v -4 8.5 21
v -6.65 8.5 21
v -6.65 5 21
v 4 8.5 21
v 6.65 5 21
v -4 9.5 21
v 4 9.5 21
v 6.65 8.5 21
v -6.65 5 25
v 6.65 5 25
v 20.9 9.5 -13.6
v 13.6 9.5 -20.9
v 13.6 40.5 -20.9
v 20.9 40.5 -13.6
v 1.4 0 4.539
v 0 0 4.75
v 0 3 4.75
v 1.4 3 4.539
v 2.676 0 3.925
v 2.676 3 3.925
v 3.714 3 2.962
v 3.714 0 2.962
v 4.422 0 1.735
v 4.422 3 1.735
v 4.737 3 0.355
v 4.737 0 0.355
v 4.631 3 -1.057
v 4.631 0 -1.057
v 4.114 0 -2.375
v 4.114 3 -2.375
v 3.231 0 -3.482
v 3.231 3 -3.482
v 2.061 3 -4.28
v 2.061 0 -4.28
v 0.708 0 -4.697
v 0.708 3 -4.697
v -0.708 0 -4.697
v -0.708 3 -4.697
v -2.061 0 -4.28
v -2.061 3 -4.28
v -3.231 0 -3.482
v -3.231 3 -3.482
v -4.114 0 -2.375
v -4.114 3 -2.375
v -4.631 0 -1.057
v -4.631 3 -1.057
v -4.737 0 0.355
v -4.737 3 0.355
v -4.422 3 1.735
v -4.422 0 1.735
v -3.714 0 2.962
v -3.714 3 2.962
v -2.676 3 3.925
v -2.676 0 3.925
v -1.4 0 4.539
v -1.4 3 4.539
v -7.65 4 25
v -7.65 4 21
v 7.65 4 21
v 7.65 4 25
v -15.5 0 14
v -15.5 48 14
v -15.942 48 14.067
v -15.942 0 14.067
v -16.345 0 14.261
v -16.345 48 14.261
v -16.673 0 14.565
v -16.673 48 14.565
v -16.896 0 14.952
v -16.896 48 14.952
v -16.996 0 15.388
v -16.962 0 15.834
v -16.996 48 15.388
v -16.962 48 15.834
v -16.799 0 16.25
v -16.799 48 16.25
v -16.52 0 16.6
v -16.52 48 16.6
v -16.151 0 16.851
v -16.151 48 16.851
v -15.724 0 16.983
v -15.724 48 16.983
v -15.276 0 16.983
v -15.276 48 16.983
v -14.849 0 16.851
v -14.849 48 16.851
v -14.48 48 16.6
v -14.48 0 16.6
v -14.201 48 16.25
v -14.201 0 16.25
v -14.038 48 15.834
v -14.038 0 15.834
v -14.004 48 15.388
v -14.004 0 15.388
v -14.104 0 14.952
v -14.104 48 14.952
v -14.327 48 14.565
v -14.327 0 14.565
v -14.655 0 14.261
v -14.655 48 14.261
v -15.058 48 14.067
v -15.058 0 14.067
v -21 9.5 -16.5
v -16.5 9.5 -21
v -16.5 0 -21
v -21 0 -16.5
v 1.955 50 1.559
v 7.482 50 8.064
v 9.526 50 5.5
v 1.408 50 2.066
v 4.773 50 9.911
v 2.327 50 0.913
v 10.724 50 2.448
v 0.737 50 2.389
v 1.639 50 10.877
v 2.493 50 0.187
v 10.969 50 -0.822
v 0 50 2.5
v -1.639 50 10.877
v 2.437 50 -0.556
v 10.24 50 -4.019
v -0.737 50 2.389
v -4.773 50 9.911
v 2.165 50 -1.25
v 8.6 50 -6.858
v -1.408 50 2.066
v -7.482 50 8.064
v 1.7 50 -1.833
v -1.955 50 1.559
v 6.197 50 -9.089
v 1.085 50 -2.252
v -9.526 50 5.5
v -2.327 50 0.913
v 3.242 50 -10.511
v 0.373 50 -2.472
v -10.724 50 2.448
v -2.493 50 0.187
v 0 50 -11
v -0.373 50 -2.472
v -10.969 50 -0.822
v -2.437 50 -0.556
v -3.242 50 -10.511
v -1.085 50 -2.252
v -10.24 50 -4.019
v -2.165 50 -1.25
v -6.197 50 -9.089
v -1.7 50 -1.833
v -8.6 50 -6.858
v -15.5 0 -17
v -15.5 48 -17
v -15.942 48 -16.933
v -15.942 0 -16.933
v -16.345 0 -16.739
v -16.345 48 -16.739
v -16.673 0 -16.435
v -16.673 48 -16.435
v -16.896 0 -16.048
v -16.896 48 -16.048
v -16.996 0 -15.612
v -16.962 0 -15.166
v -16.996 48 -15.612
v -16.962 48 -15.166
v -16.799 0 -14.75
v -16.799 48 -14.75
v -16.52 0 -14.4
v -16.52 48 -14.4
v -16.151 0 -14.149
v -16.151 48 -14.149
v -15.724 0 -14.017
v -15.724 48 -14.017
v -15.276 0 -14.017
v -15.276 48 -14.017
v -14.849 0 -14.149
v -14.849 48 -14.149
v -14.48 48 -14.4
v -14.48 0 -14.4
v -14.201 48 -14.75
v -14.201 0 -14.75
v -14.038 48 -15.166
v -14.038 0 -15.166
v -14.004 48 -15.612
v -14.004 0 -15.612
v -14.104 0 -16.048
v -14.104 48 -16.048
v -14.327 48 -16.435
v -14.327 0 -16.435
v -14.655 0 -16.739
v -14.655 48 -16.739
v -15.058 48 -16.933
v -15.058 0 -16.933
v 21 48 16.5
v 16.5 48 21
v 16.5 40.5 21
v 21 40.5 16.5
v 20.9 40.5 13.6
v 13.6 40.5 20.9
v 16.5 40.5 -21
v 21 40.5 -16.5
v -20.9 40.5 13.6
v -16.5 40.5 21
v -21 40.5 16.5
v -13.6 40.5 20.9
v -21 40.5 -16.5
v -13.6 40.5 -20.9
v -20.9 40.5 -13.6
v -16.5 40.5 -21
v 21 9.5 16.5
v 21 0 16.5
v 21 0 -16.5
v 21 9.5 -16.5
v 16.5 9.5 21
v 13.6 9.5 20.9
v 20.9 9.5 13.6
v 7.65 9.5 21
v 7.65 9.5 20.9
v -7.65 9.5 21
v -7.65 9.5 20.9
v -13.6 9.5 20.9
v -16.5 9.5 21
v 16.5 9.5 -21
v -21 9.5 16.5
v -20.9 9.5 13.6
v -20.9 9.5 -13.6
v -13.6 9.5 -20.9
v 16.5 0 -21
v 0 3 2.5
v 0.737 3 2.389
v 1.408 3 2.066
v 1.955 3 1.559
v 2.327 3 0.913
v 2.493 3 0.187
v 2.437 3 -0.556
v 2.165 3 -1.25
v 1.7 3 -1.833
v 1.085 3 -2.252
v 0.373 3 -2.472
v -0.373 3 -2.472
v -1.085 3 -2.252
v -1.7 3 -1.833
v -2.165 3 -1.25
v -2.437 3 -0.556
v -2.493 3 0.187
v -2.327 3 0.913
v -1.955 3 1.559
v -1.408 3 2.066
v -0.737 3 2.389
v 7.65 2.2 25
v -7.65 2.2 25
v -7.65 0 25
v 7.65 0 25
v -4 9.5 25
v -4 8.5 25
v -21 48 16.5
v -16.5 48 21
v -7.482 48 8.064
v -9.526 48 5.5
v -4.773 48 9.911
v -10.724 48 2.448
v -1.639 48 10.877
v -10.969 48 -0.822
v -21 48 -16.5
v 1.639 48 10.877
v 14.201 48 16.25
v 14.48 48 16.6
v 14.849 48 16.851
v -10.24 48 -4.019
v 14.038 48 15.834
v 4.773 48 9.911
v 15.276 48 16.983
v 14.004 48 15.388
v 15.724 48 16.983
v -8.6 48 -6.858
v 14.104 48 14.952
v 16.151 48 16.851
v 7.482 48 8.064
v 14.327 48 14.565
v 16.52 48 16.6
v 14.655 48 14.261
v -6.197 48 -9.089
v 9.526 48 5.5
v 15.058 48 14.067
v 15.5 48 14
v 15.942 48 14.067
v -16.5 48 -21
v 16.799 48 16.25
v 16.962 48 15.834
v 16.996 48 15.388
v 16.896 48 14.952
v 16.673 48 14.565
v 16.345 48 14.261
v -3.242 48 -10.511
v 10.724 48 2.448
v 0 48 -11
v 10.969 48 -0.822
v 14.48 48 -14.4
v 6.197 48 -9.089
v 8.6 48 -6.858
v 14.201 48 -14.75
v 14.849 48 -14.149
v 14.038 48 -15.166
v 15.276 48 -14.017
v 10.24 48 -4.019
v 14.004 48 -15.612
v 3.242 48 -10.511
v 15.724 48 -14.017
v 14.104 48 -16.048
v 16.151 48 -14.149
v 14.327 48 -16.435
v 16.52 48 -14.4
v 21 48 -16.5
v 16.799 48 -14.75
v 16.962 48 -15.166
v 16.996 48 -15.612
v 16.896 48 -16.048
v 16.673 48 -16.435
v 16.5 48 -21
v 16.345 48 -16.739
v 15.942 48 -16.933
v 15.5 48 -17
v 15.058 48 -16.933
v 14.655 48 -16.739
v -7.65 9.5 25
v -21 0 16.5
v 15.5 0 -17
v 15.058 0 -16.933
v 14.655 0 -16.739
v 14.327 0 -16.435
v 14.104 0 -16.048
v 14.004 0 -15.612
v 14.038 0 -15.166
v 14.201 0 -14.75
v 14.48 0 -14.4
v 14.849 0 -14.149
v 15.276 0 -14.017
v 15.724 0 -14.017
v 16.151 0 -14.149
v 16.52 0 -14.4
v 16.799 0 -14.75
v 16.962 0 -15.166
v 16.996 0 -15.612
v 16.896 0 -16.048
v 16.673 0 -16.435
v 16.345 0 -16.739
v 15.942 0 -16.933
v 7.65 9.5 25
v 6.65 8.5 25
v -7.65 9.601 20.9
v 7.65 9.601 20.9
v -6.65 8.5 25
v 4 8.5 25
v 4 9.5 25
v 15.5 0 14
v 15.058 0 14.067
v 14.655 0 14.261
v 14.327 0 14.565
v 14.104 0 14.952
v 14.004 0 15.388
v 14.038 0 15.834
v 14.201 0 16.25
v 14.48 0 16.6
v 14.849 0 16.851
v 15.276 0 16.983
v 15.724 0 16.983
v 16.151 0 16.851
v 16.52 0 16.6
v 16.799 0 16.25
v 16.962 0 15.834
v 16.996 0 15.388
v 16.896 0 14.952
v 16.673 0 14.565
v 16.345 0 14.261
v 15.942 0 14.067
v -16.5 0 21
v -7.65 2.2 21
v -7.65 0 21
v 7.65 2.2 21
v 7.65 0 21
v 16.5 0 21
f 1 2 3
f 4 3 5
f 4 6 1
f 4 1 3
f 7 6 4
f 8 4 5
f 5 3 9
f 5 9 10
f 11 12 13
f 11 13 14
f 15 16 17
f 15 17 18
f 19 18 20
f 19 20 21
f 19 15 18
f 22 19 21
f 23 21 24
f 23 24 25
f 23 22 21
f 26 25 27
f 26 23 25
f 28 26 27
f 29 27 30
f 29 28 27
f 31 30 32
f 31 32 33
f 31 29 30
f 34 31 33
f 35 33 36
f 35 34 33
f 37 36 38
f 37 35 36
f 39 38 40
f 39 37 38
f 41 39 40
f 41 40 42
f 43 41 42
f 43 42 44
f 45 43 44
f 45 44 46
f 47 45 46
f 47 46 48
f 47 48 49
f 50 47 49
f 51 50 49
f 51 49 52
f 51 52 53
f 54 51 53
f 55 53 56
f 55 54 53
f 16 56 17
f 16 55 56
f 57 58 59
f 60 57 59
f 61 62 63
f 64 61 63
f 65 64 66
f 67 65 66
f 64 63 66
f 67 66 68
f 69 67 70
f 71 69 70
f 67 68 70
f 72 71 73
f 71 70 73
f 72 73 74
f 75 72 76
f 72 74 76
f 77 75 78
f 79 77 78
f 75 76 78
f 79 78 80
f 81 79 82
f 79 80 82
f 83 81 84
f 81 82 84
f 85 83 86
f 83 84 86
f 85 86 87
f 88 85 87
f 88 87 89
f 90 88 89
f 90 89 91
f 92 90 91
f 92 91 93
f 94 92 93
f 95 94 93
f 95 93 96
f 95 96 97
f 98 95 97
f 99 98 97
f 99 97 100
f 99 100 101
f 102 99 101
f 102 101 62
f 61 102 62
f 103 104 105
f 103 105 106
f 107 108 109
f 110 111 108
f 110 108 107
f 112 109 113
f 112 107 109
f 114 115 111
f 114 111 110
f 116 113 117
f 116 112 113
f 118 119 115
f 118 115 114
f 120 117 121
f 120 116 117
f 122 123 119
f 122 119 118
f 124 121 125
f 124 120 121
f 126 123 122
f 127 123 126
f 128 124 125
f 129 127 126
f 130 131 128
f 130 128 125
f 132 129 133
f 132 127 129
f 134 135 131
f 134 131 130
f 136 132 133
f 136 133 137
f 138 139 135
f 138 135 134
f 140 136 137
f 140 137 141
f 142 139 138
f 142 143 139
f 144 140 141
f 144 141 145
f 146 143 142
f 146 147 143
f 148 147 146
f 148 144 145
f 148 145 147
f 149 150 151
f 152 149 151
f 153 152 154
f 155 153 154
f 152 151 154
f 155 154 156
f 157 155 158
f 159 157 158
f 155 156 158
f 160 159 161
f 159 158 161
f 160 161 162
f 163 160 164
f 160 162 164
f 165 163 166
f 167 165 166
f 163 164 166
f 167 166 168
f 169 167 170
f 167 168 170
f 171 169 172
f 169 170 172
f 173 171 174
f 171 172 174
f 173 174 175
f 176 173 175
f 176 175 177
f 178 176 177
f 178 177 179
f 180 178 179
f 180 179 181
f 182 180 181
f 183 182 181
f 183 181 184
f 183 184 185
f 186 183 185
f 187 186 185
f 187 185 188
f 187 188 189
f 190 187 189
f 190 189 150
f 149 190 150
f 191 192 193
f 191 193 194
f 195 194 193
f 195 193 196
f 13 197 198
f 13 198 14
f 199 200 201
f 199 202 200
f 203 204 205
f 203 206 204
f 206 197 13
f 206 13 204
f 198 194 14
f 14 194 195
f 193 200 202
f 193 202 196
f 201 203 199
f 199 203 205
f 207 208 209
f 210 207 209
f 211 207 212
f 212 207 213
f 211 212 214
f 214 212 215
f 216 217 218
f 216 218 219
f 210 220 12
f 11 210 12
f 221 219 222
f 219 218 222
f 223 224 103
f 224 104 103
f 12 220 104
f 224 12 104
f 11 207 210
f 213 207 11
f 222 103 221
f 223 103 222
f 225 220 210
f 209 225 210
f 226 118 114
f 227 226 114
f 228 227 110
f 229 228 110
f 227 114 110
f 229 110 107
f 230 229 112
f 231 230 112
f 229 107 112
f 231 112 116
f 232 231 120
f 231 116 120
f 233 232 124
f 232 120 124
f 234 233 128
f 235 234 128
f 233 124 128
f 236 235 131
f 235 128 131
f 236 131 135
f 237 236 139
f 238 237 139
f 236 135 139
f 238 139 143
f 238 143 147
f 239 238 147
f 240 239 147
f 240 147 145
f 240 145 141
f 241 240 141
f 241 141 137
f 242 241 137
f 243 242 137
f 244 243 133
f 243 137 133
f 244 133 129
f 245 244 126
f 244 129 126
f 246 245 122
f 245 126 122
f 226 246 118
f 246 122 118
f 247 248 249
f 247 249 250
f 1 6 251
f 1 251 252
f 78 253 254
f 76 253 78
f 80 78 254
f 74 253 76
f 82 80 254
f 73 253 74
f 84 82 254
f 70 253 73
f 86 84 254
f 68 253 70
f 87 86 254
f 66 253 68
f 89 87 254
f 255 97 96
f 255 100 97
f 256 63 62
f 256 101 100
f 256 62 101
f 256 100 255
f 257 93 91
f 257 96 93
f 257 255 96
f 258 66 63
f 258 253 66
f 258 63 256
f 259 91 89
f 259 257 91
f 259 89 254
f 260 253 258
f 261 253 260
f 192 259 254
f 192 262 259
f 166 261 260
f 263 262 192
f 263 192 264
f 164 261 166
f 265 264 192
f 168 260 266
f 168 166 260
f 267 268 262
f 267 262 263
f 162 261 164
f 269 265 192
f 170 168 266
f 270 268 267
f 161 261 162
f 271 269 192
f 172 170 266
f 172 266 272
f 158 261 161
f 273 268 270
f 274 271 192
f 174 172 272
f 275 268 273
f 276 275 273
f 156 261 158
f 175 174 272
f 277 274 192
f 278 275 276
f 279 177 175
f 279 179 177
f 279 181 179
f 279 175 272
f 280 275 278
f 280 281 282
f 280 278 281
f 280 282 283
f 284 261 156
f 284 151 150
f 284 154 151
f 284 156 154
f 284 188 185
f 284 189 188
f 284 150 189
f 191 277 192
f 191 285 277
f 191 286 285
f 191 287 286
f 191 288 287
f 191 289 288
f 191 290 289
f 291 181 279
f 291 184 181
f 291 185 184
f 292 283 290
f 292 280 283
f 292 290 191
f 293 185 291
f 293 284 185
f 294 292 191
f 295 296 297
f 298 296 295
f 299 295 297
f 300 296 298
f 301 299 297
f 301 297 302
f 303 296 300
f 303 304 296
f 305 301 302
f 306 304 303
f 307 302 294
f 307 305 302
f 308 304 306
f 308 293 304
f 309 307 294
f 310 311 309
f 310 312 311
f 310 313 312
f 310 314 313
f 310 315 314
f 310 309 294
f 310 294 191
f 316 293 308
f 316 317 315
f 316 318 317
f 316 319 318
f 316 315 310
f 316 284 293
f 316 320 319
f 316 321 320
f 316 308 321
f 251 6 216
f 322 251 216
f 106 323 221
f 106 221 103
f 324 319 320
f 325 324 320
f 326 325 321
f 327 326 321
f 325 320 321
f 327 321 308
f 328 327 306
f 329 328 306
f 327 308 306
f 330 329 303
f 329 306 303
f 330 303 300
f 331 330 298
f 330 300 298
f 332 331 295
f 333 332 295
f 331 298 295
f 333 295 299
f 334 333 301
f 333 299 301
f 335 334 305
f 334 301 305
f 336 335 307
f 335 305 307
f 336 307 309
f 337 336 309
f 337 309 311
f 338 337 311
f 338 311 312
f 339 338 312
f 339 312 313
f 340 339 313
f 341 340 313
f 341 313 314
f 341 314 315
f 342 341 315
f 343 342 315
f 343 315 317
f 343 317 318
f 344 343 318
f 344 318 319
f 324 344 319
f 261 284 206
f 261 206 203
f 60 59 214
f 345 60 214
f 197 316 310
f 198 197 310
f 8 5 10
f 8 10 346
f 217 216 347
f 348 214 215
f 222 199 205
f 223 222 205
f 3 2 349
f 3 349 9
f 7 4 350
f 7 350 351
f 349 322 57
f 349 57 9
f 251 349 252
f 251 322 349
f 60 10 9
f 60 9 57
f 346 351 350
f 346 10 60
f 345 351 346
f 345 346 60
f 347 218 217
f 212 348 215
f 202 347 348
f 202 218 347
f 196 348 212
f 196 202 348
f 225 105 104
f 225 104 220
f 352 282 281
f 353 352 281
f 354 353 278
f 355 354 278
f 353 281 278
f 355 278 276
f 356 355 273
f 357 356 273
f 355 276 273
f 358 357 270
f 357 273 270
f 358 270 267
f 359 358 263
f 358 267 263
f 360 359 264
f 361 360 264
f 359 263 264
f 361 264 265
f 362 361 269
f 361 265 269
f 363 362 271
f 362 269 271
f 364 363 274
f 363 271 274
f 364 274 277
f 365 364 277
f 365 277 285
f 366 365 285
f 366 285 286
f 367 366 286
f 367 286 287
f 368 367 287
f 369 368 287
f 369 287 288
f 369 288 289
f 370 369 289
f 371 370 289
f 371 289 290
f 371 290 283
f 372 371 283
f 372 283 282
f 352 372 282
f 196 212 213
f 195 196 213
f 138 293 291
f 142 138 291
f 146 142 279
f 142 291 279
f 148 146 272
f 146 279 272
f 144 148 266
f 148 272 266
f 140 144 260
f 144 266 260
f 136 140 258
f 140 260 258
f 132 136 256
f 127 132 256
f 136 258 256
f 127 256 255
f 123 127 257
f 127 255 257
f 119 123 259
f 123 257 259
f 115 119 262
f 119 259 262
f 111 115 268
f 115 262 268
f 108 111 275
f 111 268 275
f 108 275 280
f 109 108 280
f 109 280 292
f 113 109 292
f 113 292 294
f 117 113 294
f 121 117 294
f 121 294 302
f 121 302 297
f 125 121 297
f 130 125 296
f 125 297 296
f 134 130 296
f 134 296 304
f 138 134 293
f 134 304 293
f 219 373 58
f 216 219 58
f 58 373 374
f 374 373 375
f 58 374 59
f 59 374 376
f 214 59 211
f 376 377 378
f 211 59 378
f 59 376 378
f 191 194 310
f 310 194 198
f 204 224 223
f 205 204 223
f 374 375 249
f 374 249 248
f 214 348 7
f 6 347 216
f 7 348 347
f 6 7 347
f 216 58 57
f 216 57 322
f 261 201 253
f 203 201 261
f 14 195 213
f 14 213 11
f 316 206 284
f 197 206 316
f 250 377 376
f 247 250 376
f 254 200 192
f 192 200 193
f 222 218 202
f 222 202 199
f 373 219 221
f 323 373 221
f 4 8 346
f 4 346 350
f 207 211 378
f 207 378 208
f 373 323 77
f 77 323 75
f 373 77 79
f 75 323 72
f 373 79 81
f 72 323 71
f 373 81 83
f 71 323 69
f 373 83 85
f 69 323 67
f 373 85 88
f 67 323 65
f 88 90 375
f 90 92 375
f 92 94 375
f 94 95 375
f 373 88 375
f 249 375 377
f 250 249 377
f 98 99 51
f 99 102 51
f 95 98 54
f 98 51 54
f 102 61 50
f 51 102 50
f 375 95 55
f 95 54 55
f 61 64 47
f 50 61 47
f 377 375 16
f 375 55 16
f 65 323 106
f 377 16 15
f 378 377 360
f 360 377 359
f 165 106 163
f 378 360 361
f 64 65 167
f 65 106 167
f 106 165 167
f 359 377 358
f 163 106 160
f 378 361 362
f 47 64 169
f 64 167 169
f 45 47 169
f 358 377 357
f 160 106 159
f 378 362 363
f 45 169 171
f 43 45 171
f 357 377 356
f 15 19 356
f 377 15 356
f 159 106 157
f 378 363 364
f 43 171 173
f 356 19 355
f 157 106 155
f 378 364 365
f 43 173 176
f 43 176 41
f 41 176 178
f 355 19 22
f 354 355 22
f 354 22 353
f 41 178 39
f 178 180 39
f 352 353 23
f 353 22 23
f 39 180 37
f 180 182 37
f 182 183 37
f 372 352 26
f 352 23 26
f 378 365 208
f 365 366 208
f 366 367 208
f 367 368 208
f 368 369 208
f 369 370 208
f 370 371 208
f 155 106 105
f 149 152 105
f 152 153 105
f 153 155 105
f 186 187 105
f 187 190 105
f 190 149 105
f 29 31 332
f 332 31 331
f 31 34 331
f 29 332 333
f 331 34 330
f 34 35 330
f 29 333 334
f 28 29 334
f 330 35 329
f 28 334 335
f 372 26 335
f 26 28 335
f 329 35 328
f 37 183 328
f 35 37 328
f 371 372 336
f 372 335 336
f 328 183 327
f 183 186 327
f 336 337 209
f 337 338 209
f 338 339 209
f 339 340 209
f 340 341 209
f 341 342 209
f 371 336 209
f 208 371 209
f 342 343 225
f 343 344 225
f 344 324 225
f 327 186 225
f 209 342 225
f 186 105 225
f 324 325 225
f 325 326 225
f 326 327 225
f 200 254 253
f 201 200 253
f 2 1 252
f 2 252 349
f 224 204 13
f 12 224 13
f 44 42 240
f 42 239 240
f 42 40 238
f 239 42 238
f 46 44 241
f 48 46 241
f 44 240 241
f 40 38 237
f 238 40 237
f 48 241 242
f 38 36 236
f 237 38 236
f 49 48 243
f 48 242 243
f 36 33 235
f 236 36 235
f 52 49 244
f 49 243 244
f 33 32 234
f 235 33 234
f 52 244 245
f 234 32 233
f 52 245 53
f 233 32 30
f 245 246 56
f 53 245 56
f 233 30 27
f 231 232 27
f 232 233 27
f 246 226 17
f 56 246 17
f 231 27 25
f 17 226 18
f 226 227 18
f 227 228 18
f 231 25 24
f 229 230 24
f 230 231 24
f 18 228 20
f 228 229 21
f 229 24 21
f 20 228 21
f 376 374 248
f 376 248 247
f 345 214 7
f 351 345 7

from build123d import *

# Parameters (mm, degrees)
SKETCH_1_W           = 42
SKETCH_1_H           = 42
EXTRUDE_1_DEPTH      = 48
CUT_EXTRUDE_START    = 48
CUT_EXTRUDE_1_DEPTH  = 48
CUT_EXTRUDE_START_2  = 9.5
CUT_EXTRUDE_2_DEPTH  = 31
CUT_EXTRUDE_START_3  = -21
SKETCH_4_W           = 33
SKETCH_4_H           = 31
CUT_EXTRUDE_3_DEPTH  = 0.1
CUT_EXTRUDE_START_4  = 21
SKETCH_5_W           = 33
SKETCH_5_H           = 31
CUT_EXTRUDE_4_DEPTH  = 0.1
SKETCH_6_W           = 33
SKETCH_6_H           = 31
CUT_EXTRUDE_5_DEPTH  = 0.1
SKETCH_7_W           = 33
SKETCH_7_H           = 31
CUT_EXTRUDE_6_DEPTH  = 0.1
SKETCH_17_R          = 4.75
CUT_EXTRUDE_9_DEPTH  = 3
EXTRUDE_START        = 48
SKETCH_18_R          = 11
EXTRUDE_2_DEPTH      = 2
CUT_EXTRUDE_START_5  = 50
SKETCH_20_R          = 2.5
CUT_EXTRUDE_10_DEPTH = 47
EXTRUDE_START_2      = 21
SKETCH_21_W          = 15.3
SKETCH_21_H          = 2.2
EXTRUDE_3_DEPTH      = 4
SKETCH_22_W          = 15.3
SKETCH_22_H          = 5.5
EXTRUDE_4_DEPTH      = 4
CUT_EXTRUDE_11_DEPTH = 4
EXTRUDE_START_3      = -7.65
EXTRUDE_5_DEPTH      = 15.3
SKETCH_8_R           = 1.5
CUT_EXTRUDE_12_DEPTH = 108.715994507


with BuildPart() as part:
    # 草图1 → 凸台-拉伸1 (new body)
    with BuildSketch(Plane(origin=(0, 0, 0), x_dir=(1, 0, 0), z_dir=(0, 1, 0))):
        Rectangle(SKETCH_1_W, SKETCH_1_H)
    extrude(amount=EXTRUDE_1_DEPTH)

    # 草图2 → 切除-拉伸1 (cut)
    with BuildSketch(Plane(origin=(0, 0, 0), x_dir=(1, 0, 0), z_dir=(0, 1, 0)).offset(CUT_EXTRUDE_START)):
        Polygon((-21, 21), (-16.5, 21), (-21, 16.5), align=None)
        Polygon((21, 16.5), (21, 21), (16.5, 21), align=None)
        Polygon((21, -21), (16.5, -21), (21, -16.5), align=None)
        Polygon((-21, -16.5), (-21, -21), (-16.5, -21), align=None)
    extrude(amount=-CUT_EXTRUDE_1_DEPTH, mode=Mode.SUBTRACT)

    # 草图3 → 切除-拉伸2 (cut)
    with BuildSketch(Plane(origin=(0, 0, 0), x_dir=(1, 0, 0), z_dir=(0, 1, 0)).offset(CUT_EXTRUDE_START_2)):
        Polygon((-21, 13.5), (-21, 21), (-13.5, 21), align=None)
        Polygon((13.5, 21), (21, 13.5), (21, 21), align=None)
        Polygon((21, -13.5), (21, -21), (13.5, -21), align=None)
        Polygon((-13.5, -21), (-21, -13.5), (-21, -21), align=None)
    extrude(amount=CUT_EXTRUDE_2_DEPTH, mode=Mode.SUBTRACT)

    # 草图4 → 切除-拉伸3 (cut)
    with BuildSketch(Plane.XY.offset(CUT_EXTRUDE_START_3)):
        with Locations((0, 25)):
            Rectangle(SKETCH_4_W, SKETCH_4_H)
    extrude(amount=CUT_EXTRUDE_3_DEPTH, mode=Mode.SUBTRACT)

    # 草图5 → 切除-拉伸4 (cut)
    with BuildSketch(Plane.XY.offset(CUT_EXTRUDE_START_4)):
        with Locations((0, 25)):
            Rectangle(SKETCH_5_W, SKETCH_5_H)
    extrude(amount=-CUT_EXTRUDE_4_DEPTH, mode=Mode.SUBTRACT)

    # 草图6 → 切除-拉伸5 (cut)
    with BuildSketch(Plane(origin=(0, 0, 0), x_dir=(0, 0, -1), z_dir=(1, 0, 0)).offset(CUT_EXTRUDE_START_3)):
        with Locations((0, 25)):
            Rectangle(SKETCH_6_W, SKETCH_6_H)
    extrude(amount=CUT_EXTRUDE_5_DEPTH, mode=Mode.SUBTRACT)

    # 草图7 → 切除-拉伸6 (cut)
    with BuildSketch(Plane(origin=(0, 0, 0), x_dir=(0, 0, -1), z_dir=(1, 0, 0)).offset(CUT_EXTRUDE_START_4)):
        with Locations((0, 25)):
            Rectangle(SKETCH_7_W, SKETCH_7_H)
    extrude(amount=-CUT_EXTRUDE_6_DEPTH, mode=Mode.SUBTRACT)

    # 草图17 → 切除-拉伸9 (cut)
    with BuildSketch(Plane(origin=(0, 0, 0), x_dir=(1, 0, 0), z_dir=(0, 1, 0))):
        with Locations(Location((0, 0, 0), (0, 0, 270))):
            Circle(SKETCH_17_R)
    extrude(amount=CUT_EXTRUDE_9_DEPTH, mode=Mode.SUBTRACT)

    # 草图18 → 凸台-拉伸2 (add)
    with BuildSketch(Plane(origin=(0, 0, 0), x_dir=(1, 0, 0), z_dir=(0, 1, 0)).offset(EXTRUDE_START)):
        with Locations(Location((0, 0, 0), (0, 0, 90))):
            Circle(SKETCH_18_R)
    extrude(amount=EXTRUDE_2_DEPTH)

    # 草图20 → 切除-拉伸10 (cut)
    with BuildSketch(Plane(origin=(0, 0, 0), x_dir=(1, 0, 0), z_dir=(0, 1, 0)).offset(CUT_EXTRUDE_START_5)):
        with Locations(Location((0, 0, 0), (0, 0, 270))):
            Circle(SKETCH_20_R)
    extrude(amount=-CUT_EXTRUDE_10_DEPTH, mode=Mode.SUBTRACT)

    # 草图21 → 凸台-拉伸3 (add)
    with BuildSketch(Plane.XY.offset(EXTRUDE_START_2)):
        with Locations((0, 1.1)):
            Rectangle(SKETCH_21_W, SKETCH_21_H)
    extrude(amount=EXTRUDE_3_DEPTH)

    # 草图22 → 凸台-拉伸4 (add)
    with BuildSketch(Plane.XY.offset(EXTRUDE_START_2)):
        with Locations((0, 6.75)):
            Rectangle(SKETCH_22_W, SKETCH_22_H)
    extrude(amount=EXTRUDE_4_DEPTH)

    # 草图23 → 切除-拉伸11 (cut)
    with BuildSketch(Plane.XY.offset(CUT_EXTRUDE_START_4)):
        Polygon((-6.65, 8.5), (-6.65, 5), (6.65, 5), (6.65, 8.5), (4, 8.5), (4, 9.5), (-4, 9.5), (-4, 8.5), align=None)
    extrude(amount=CUT_EXTRUDE_11_DEPTH, mode=Mode.SUBTRACT)

    # 草图26 → 凸台-拉伸5 (add)
    with BuildSketch(Plane(origin=(0, 0, 0), x_dir=(0, 0, -1), z_dir=(1, 0, 0)).offset(EXTRUDE_START_3)):
        Polygon((-21, 9.5), (-20.9, 9.5), (-20.9, 9.601292788), align=None)
    extrude(amount=EXTRUDE_5_DEPTH)

    # 草图8 → 切除-拉伸12 (cut, through all)
    with BuildSketch(Plane(origin=(0, 0, 0), x_dir=(1, 0, 0), z_dir=(0, 1, 0)).offset(CUT_EXTRUDE_START)):
        with Locations(Location((-15.5, 15.5, 0), (0, 0, 90))):
            Circle(SKETCH_8_R)
        with Locations(Location((15.5, 15.5, 0), (0, 0, 90))):
            Circle(SKETCH_8_R)
        with Locations(Location((-15.5, -15.5, 0), (0, 0, 90))):
            Circle(SKETCH_8_R)
        with Locations(Location((15.5, -15.5, 0), (0, 0, 90))):
            Circle(SKETCH_8_R)
    extrude(amount=-CUT_EXTRUDE_12_DEPTH, mode=Mode.SUBTRACT)


solid = part.part
